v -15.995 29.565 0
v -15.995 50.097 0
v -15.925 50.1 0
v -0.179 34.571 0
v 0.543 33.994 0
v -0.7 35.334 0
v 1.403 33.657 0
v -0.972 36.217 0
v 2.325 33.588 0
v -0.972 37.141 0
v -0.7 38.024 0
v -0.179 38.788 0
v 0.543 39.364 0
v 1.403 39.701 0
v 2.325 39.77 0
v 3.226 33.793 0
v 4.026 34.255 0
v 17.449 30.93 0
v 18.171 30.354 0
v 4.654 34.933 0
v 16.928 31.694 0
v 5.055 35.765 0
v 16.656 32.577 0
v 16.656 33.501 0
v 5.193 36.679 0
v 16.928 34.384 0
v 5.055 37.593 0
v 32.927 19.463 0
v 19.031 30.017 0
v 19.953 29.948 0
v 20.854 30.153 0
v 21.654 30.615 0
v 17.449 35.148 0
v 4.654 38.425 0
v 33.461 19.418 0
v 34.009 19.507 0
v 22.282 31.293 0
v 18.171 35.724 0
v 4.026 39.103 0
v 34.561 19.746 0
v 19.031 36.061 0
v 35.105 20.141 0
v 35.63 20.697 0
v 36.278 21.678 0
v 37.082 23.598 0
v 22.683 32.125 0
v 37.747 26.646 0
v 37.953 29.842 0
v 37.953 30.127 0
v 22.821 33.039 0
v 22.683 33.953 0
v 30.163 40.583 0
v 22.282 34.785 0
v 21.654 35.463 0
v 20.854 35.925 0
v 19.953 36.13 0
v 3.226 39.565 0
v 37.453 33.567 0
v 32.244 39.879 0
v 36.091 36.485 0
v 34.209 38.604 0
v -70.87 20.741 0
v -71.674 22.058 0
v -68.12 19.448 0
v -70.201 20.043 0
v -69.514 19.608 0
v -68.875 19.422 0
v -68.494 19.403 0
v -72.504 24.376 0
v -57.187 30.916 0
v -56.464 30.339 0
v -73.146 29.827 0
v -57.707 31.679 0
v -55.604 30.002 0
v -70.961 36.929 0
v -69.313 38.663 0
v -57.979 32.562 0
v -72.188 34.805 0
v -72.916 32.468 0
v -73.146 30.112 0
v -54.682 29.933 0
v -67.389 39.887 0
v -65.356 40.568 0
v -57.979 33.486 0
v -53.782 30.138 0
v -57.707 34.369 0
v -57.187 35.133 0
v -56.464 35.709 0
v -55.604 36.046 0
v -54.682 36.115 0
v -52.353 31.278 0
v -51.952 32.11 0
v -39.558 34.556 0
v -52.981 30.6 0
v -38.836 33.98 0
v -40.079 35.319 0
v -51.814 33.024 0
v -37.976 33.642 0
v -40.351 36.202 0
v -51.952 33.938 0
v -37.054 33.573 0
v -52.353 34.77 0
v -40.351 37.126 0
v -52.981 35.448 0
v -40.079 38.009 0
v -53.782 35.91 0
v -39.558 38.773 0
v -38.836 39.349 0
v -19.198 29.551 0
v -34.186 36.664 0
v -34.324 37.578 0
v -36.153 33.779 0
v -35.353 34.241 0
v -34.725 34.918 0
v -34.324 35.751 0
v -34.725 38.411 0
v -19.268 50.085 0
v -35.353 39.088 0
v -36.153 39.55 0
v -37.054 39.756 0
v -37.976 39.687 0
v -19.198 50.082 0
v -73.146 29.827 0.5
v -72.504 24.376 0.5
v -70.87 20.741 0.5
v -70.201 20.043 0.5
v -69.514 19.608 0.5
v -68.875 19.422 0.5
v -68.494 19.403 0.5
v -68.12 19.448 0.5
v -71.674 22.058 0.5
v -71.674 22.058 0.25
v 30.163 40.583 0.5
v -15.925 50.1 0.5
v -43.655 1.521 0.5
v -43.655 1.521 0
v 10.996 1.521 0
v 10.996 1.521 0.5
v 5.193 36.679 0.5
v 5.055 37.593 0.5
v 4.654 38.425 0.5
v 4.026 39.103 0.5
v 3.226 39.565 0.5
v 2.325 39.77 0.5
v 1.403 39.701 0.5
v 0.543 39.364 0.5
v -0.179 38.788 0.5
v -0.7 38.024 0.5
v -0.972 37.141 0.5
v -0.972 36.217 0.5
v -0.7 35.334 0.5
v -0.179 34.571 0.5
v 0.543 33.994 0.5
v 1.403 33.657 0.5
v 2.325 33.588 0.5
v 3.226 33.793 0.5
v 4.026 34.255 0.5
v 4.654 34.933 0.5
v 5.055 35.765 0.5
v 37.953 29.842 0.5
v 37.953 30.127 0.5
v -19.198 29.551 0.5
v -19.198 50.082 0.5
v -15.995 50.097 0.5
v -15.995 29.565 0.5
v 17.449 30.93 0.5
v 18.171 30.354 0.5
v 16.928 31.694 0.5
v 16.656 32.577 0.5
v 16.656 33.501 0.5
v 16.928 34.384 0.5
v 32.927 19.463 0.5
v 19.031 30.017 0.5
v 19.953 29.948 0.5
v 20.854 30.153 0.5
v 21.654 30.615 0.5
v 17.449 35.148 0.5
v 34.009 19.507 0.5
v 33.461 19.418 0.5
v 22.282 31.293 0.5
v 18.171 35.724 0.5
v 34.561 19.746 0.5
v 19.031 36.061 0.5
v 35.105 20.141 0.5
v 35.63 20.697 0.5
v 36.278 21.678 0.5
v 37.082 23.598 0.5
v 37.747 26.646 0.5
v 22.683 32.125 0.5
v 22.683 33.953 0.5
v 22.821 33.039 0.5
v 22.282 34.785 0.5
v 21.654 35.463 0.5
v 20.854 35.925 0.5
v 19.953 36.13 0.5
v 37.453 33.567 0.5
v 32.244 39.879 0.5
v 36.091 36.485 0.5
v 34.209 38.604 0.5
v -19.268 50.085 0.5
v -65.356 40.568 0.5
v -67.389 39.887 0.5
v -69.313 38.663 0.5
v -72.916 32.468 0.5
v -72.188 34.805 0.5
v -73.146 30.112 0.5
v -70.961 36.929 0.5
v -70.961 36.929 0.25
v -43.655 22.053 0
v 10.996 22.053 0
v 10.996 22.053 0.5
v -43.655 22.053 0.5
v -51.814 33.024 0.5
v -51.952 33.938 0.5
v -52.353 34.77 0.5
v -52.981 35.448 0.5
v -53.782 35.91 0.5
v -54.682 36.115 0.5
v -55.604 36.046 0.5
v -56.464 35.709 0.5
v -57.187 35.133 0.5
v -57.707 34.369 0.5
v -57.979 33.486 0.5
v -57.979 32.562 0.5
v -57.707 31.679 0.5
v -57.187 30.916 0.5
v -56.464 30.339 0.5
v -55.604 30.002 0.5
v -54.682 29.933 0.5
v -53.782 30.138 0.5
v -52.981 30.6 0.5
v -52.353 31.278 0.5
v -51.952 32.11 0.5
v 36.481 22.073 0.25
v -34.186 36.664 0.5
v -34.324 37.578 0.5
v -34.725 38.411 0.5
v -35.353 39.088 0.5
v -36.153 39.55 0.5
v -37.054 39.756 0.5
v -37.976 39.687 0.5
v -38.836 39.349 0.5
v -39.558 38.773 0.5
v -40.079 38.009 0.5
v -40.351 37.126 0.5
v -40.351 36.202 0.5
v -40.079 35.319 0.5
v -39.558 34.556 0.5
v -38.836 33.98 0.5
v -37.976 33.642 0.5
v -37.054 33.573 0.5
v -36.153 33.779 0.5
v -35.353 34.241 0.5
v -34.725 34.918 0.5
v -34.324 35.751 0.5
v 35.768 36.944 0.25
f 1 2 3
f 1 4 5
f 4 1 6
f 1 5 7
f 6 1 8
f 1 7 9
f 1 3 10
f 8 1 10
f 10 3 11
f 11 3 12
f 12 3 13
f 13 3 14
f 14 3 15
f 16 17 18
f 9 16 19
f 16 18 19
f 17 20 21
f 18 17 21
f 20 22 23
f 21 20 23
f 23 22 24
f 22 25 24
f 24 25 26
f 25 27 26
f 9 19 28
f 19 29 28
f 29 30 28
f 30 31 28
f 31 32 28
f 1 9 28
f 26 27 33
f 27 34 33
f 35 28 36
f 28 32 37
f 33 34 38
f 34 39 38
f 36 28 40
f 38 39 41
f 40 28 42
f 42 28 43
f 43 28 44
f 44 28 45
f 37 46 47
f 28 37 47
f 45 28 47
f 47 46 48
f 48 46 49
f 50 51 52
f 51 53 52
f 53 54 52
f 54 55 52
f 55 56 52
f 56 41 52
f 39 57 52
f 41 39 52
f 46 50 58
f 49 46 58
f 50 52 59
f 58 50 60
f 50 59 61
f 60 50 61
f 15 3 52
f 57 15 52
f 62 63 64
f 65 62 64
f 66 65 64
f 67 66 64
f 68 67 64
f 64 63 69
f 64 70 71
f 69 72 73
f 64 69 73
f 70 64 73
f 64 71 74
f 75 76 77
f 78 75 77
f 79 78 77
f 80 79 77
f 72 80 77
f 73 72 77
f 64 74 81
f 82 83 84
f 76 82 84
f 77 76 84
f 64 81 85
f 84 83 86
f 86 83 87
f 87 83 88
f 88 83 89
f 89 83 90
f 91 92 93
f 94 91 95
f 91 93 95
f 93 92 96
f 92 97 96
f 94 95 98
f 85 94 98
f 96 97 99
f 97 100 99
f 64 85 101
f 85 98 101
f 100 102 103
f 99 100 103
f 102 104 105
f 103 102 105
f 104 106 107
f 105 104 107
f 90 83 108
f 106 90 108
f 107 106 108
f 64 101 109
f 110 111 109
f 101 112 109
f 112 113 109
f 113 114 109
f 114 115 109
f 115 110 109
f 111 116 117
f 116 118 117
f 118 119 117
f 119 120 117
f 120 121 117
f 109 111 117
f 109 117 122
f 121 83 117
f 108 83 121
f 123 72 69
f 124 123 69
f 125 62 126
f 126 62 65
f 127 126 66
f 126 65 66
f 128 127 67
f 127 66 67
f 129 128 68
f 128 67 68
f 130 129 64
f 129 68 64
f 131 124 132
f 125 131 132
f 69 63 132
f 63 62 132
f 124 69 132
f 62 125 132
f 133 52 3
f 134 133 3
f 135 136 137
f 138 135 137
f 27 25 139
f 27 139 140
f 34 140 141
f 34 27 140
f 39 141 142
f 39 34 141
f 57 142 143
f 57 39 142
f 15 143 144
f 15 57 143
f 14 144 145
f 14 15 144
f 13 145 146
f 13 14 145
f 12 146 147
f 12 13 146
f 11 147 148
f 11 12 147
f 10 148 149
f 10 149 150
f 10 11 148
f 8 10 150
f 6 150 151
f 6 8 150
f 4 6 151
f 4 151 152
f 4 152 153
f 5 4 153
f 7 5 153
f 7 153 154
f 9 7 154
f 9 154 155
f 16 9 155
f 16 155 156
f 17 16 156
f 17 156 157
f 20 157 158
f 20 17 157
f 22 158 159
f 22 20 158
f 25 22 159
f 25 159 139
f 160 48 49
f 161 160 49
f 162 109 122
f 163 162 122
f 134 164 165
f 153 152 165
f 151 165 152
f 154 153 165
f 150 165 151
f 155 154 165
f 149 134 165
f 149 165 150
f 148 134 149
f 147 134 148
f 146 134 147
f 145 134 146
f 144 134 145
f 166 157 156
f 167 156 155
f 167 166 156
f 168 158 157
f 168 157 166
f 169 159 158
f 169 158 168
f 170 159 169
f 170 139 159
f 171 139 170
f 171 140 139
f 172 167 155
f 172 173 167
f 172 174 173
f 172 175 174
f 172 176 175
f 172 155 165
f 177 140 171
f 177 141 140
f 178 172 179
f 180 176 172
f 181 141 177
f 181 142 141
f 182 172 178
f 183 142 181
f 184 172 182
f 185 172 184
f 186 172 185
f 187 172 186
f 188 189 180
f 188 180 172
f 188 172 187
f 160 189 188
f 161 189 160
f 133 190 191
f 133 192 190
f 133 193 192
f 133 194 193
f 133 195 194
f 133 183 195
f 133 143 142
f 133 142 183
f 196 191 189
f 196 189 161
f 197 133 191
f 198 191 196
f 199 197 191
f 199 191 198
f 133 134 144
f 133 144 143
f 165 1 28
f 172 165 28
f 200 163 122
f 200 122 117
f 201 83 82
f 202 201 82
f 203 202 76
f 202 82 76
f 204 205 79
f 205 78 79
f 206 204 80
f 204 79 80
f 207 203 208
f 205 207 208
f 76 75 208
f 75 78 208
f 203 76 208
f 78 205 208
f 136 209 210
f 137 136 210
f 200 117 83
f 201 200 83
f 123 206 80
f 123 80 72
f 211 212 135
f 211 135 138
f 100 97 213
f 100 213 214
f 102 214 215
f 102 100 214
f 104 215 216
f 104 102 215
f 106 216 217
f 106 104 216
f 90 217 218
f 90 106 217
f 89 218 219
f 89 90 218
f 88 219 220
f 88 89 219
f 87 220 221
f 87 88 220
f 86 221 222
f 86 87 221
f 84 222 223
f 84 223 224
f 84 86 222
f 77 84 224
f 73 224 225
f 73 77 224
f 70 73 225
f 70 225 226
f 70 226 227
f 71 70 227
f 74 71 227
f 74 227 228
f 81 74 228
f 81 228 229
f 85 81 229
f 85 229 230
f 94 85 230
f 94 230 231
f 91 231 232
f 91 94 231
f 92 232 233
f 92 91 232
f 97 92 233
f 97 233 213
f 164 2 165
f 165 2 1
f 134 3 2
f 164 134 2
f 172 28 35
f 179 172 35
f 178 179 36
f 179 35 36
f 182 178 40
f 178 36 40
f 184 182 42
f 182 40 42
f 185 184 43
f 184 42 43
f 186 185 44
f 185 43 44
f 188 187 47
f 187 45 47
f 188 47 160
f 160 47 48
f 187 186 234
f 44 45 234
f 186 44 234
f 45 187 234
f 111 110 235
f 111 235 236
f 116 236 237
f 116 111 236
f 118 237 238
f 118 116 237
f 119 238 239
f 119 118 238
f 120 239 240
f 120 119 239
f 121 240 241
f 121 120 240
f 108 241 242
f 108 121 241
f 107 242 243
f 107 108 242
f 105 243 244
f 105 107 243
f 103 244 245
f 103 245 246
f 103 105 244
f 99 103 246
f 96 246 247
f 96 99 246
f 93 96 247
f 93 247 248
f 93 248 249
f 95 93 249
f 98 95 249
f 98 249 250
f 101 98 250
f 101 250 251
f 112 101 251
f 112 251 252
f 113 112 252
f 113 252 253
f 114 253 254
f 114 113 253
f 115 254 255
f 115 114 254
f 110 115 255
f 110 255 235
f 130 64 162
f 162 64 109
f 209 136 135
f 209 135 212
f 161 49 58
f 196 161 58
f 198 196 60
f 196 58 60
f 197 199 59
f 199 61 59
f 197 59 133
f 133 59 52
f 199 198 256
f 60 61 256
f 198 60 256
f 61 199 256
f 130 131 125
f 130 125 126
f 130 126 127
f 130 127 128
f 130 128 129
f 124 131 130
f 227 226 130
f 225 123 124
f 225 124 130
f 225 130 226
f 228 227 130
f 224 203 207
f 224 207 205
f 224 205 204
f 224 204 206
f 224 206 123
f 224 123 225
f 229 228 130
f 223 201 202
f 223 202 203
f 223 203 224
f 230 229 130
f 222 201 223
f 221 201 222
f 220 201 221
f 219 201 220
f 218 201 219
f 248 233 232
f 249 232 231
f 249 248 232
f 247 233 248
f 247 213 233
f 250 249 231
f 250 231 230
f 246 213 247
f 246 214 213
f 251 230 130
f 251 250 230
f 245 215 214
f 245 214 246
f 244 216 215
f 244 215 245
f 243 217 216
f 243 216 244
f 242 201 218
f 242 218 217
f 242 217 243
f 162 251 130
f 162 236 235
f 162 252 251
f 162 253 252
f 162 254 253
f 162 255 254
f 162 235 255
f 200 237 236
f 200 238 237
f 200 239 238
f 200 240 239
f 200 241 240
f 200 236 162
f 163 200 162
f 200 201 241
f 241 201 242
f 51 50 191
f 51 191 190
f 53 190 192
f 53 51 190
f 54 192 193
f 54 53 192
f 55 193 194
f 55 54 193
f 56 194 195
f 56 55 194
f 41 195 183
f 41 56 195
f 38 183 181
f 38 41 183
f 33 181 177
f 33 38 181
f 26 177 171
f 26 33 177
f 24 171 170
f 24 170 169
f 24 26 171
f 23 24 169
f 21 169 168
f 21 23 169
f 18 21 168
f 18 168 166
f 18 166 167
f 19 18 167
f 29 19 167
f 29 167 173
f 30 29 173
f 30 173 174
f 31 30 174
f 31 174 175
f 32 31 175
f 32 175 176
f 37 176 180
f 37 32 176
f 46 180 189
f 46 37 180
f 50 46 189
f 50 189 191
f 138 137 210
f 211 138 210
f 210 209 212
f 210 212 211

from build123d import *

# Parameters (mm, degrees)
F0_W     = 54.6514175418
F0_H     = 20.5313651892
F1_DEPTH = 0.5
F0_R     = 3.1


with BuildPart() as f1:
    # F0 (on Top) → F1 (new body)
    with BuildSketch(Plane.XY):
        with Locations((-16.3295302747, 11.7870307329)):
            Rectangle(F0_W, F0_H)
    extrude(amount=F1_DEPTH)


with BuildPart() as f1b:
    # F0 (on Top) → F1, piece 2 (new body)
    with BuildSketch(Plane.XY):
        with BuildLine():
            Line((-15.9252768231, 50.1002492018), (-15.9950423984, 50.0968298944))
            Line((-15.9950423984, 50.0968298944), (-15.9950423984, 29.5654647052))
            Line((-15.9950423987, 29.5654647053), (32.9274407181, 19.4632269413))
            add(Edge.make_bspline(
                [(32.9274407182, 19.4632269413), (37.9529358903, 18.4254883828), (37.9529358903, 29.8417054517)],
                knots=[3.0295878582, 3.0295878582, 3.0295878582, 4.600384185, 4.600384185, 4.600384185], degree=2, weights=[1, 0.7071067812, 1]))
            Line((37.9529358903, 29.8417054517), (37.9529358903, 30.1265521042))
            add(Edge.make_bspline(
                [(37.9529358903, 30.1265521043), (37.9529358903, 38.974679107), (30.1629264211, 40.5832754584)],
                knots=[4.9392817831, 4.9392817831, 4.9392817831, 6.2831853072, 6.2831853072, 6.2831853072], degree=2, weights=[1, 0.7826081569, 1]))
            Line((30.1629264207, 40.5832754584), (-15.9252768231, 50.1002492018))
        make_face()
        with Locations((2.0930070391, 36.6791412847)):
            Circle(F0_R, mode=Mode.SUBTRACT)
        with Locations((19.7210984426, 33.0390322931)):
            Circle(F0_R, mode=Mode.SUBTRACT)
    extrude(amount=F1_DEPTH)


with BuildPart() as f1c:
    # F0 (on Top) → F1, piece 3 (new body)
    with BuildSketch(Plane.XY):
        with BuildLine():
            Line((-68.1204050776, 19.4483455271), (-19.1979219609, 29.5505832911))
            Line((-19.1979219612, 29.550583291), (-19.197921961, 50.0819484802))
            Line((-19.197921961, 50.0819484802), (-19.2676875364, 50.0853677876))
            Line((-19.2676875363, 50.0853677876), (-65.3558907805, 40.5683940442))
            add(Edge.make_bspline(
                [(-65.3558907805, 40.5683940442), (-73.1459002498, 38.9597976928), (-73.1459002498, 30.1116706901)],
                knots=[0, 0, 0, 1.343903524, 1.343903524, 1.343903524], degree=2, weights=[1, 0.7826081569, 1]))
            Line((-73.1459002498, 30.11167069), (-73.1459002498, 29.8268240375))
            add(Edge.make_bspline(
                [(-73.1459002498, 29.8268240376), (-73.1459002498, 18.4106069688), (-68.1204050777, 19.4483455271)],
                knots=[4.8243937758, 4.8243937758, 4.8243937758, 6.3951901025, 6.3951901025, 6.3951901025], degree=2, weights=[1, 0.7071067812, 1]))
        make_face()
        with Locations((-54.914062802, 33.024150879)):
            Circle(F0_R, mode=Mode.SUBTRACT)
        with Locations((-37.2859756521, 36.6642589922)):
            Circle(F0_R, mode=Mode.SUBTRACT)
    extrude(amount=F1_DEPTH)


solid = Compound([f1.part, f1b.part, f1c.part])
